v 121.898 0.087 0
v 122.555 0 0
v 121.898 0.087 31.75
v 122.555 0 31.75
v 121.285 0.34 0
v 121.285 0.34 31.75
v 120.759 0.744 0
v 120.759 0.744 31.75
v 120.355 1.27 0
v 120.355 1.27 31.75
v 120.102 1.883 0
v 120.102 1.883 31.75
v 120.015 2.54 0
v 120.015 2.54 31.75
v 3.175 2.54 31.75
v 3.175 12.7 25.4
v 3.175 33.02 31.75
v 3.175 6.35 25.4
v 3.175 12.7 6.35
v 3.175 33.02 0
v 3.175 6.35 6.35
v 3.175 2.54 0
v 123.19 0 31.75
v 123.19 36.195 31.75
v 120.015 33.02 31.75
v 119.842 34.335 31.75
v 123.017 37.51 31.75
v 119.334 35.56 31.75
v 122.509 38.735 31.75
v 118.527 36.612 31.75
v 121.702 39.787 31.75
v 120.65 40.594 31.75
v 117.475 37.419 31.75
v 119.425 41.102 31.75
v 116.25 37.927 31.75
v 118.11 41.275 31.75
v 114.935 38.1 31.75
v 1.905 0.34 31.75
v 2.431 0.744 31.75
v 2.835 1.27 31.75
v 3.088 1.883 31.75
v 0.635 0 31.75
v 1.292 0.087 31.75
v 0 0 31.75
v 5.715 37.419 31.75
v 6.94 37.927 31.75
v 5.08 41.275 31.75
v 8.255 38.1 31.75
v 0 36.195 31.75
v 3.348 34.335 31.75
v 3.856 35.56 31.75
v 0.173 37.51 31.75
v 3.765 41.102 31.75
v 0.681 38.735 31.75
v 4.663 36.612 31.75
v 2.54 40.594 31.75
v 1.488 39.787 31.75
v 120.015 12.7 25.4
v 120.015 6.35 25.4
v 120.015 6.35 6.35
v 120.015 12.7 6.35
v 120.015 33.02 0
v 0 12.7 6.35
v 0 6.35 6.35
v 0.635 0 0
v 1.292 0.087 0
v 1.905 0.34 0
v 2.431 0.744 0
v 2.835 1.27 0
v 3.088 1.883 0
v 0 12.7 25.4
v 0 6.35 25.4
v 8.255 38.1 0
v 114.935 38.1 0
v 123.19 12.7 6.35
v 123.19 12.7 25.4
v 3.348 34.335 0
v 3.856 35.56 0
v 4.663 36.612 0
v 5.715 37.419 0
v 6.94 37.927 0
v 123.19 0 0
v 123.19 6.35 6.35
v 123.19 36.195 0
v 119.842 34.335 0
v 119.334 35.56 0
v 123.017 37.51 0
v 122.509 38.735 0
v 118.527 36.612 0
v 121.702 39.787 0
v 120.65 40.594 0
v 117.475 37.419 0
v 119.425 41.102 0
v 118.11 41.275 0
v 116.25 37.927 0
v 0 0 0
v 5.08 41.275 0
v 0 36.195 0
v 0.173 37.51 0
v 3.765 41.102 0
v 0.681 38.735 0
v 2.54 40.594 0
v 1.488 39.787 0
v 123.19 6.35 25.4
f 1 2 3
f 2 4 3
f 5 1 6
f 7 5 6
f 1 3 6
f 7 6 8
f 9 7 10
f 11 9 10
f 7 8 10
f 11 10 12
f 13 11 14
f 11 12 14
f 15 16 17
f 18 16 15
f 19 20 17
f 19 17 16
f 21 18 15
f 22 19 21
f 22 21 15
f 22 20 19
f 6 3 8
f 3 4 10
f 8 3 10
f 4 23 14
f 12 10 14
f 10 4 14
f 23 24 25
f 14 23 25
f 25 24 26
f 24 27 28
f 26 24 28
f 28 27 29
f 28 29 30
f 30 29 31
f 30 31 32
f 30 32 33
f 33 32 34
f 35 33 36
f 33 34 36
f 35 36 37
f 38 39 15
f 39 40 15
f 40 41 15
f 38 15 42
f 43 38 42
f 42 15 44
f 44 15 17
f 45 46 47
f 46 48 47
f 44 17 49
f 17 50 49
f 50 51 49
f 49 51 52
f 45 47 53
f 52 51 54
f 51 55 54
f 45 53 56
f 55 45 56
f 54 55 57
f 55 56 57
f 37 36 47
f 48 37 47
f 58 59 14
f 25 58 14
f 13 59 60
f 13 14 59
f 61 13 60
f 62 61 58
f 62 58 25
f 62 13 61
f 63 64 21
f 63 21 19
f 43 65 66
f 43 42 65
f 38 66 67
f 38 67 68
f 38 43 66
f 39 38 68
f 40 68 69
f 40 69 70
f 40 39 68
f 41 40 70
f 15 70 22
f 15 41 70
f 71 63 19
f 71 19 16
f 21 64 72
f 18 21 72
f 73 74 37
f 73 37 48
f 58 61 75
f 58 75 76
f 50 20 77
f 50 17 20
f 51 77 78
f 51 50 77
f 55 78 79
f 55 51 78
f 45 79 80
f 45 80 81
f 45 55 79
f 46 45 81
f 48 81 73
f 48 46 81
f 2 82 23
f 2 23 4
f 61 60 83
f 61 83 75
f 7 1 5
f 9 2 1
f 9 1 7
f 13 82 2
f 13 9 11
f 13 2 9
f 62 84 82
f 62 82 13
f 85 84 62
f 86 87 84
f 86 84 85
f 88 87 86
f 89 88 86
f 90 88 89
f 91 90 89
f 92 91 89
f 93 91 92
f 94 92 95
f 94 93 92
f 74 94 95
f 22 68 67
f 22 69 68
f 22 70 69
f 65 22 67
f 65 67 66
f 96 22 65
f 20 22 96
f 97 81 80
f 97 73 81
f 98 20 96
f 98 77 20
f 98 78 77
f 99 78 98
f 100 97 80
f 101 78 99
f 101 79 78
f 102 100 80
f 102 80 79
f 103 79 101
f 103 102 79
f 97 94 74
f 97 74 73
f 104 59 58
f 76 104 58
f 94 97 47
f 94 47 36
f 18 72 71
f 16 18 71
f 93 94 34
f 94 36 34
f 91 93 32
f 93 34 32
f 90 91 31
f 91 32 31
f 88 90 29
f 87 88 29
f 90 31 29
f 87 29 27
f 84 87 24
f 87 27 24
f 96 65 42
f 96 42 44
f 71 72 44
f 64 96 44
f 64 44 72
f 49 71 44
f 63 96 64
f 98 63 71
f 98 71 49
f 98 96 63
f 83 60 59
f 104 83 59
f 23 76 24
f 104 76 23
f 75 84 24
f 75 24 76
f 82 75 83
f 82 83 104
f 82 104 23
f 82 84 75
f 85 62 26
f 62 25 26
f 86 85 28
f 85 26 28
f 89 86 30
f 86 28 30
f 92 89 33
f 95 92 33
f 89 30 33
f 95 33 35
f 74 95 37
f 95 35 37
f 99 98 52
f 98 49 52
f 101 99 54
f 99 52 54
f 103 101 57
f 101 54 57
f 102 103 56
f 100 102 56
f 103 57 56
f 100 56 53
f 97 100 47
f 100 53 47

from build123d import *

# Parameters (mm, degrees)
BOSS_EXTRUDE1_DEPTH = 31.75
SKETCH2_W           = 19.05
SKETCH2_H           = 6.35
CUT_EXTRUDE1_DEPTH  = 134.744025007
FILLET1_R           = 5.08
FILLET2_R           = 2.54


with BuildPart() as part:
    # Sketch1 → Boss-Extrude1 (new body)
    with BuildSketch(Plane.XY):
        Polygon((0, 0), (0, 41.275), (123.19, 41.275), (123.19, 0), (120.015, 0), (120.015, 38.1), (3.175, 38.1), (3.175, 0), align=None)
    extrude(amount=BOSS_EXTRUDE1_DEPTH)

    # Sketch2 → Cut-Extrude1 (cut, through all)
    with BuildSketch(Plane.ZY):
        with Locations((15.875, 9.525)):
            Rectangle(SKETCH2_W, SKETCH2_H)
    extrude(amount=-CUT_EXTRUDE1_DEPTH, mode=Mode.SUBTRACT)

    # Fillet1
    fillet1_edges = [part.edges().sort_by_distance(p)[0] for p in [
        (0, 41.275, 15.875),
        (123.19, 41.275, 15.875),
        (120.015, 38.1, 15.875),
        (3.175, 38.1, 15.875),
    ]]
    fillet(fillet1_edges, radius=FILLET1_R)

    # Fillet2
    fillet2_edges = [part.edges().sort_by_distance(p)[0] for p in [
        (120.015, 0, 15.875),
        (3.175, 0, 15.875),
    ]]
    fillet(fillet2_edges, radius=FILLET2_R)


solid = part.part
